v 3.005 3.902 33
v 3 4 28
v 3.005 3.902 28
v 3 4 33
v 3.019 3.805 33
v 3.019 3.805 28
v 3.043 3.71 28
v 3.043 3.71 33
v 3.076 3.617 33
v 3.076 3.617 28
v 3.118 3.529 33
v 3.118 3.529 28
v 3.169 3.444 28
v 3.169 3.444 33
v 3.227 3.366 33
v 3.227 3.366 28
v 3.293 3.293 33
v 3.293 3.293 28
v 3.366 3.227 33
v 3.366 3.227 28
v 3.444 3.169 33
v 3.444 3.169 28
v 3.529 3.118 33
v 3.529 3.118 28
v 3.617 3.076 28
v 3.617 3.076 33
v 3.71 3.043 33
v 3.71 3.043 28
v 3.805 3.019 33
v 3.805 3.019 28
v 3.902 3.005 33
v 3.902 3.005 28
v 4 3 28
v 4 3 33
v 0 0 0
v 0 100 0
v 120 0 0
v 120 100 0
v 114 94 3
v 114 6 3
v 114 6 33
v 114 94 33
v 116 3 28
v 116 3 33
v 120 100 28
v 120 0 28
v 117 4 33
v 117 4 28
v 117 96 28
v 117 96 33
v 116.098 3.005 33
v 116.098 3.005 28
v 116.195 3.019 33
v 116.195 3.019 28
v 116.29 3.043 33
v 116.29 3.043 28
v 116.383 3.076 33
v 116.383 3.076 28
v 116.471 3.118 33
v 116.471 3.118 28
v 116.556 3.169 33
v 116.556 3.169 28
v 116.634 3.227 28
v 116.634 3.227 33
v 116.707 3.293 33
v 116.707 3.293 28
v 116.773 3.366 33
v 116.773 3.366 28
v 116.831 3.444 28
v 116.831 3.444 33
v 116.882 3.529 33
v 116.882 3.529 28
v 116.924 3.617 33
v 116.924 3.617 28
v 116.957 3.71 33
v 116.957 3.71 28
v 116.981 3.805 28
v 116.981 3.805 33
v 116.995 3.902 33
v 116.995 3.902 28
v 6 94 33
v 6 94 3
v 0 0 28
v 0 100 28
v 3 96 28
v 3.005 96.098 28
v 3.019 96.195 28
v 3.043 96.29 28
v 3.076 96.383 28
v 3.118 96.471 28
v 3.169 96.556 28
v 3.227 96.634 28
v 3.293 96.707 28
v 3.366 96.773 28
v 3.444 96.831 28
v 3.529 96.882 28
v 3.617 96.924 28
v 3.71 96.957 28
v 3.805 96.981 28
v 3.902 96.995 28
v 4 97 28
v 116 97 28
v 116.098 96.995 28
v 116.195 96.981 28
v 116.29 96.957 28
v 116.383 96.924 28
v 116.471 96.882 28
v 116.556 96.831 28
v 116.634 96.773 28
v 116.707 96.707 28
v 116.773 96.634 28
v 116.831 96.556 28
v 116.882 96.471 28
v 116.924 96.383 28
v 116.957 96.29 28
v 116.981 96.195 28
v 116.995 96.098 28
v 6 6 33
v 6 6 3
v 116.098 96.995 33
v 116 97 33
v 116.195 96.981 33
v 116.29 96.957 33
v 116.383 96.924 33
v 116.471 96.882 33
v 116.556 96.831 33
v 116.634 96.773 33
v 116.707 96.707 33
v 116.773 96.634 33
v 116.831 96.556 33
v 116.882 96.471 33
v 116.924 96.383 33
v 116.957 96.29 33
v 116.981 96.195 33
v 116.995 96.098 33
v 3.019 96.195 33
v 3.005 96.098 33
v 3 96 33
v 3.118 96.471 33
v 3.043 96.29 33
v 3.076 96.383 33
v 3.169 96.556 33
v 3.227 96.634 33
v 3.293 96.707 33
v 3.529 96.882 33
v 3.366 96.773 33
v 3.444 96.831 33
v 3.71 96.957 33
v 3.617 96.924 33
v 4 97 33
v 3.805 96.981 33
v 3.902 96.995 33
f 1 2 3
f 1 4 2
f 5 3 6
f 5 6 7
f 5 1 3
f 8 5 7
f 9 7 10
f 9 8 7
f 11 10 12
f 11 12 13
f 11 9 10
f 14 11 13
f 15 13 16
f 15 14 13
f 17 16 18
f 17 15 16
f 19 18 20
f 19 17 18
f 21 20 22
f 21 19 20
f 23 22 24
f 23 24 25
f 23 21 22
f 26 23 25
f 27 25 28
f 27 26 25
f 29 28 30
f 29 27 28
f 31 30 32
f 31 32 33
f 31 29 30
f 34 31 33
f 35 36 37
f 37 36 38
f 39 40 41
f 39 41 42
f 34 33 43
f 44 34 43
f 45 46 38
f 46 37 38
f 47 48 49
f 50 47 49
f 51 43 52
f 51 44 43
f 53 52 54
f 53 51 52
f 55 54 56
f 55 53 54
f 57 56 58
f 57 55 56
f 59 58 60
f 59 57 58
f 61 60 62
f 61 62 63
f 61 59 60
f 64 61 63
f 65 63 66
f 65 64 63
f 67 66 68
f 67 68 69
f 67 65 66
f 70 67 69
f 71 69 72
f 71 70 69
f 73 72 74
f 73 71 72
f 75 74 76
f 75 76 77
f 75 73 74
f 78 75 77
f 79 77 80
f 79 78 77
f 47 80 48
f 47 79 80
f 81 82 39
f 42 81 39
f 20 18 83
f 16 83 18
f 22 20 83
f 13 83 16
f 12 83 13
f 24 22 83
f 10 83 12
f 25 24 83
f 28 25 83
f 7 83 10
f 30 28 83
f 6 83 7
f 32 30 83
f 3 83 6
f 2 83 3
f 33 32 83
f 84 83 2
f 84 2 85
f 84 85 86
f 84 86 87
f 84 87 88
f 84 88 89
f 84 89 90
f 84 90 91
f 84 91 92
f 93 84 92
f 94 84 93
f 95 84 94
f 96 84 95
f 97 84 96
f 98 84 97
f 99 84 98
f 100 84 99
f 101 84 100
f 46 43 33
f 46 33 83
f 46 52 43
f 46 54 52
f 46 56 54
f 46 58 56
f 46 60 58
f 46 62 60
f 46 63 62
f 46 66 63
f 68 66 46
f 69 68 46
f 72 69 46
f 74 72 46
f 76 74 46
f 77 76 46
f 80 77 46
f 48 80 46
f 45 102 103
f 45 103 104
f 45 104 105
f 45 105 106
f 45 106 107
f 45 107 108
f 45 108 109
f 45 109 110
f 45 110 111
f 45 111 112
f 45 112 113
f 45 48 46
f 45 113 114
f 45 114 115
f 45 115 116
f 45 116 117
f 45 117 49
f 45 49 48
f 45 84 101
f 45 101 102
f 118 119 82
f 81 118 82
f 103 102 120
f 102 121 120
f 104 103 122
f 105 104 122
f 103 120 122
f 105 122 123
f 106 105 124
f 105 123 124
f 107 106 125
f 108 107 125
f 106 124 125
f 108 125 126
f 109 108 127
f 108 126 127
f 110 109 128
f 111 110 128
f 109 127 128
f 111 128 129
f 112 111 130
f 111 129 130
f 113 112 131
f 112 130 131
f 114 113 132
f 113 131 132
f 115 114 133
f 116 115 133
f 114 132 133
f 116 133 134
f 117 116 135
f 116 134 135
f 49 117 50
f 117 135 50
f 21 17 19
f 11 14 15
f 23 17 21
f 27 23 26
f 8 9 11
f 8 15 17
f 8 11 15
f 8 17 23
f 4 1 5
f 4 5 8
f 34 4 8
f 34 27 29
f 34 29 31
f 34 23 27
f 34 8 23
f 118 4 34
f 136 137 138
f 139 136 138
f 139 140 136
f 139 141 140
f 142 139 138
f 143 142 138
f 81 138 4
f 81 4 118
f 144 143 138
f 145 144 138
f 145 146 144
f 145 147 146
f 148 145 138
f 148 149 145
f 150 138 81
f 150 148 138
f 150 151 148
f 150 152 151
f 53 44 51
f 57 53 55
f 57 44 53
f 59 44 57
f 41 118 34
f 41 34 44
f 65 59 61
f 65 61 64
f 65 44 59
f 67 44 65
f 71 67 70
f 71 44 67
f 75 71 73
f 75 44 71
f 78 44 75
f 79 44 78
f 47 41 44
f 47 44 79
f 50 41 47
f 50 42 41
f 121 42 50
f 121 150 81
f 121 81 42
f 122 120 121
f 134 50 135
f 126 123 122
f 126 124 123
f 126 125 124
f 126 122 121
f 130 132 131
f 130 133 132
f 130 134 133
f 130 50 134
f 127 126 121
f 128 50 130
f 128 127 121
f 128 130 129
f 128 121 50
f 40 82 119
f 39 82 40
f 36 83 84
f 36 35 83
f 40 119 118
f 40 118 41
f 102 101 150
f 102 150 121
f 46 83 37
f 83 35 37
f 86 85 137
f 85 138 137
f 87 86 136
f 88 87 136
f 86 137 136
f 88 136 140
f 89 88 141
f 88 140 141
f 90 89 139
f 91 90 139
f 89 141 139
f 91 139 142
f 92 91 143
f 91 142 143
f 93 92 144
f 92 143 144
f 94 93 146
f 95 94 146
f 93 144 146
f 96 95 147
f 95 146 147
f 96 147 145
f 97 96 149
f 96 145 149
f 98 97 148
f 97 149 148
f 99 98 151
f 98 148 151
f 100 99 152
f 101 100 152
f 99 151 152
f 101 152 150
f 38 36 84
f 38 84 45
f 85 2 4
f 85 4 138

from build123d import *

# Parameters (mm, degrees)
CROQUIS1_W              = 120
CROQUIS1_H              = 100
SALIENTE_EXTRUIR1_DEPTH = 3
CROQUIS3_W              = 120
CROQUIS3_H              = 100
CROQUIS3_W_2            = 114
CROQUIS3_H_2            = 94
SALIENTE_EXTRUIR2_DEPTH = 25
CROQUIS4_W              = 114
CROQUIS4_H              = 94
CROQUIS4_W_2            = 108
CROQUIS4_H_2            = 88
SALIENTE_EXTRUIR3_DEPTH = 30
REDONDEO1_R             = 1


with BuildPart() as part:
    # Croquis1 → Saliente-Extruir1 (new body)
    with BuildSketch(Plane.XY):
        with Locations((60, 50)):
            Rectangle(CROQUIS1_W, CROQUIS1_H)
    extrude(amount=SALIENTE_EXTRUIR1_DEPTH)

    # Croquis3 → Saliente-Extruir2 (add)
    with BuildSketch(Plane.XY.offset(3)):
        with Locations((60, 50)):
            Rectangle(CROQUIS3_W, CROQUIS3_H)
        with Locations((60, 50)):
            Rectangle(CROQUIS3_W_2, CROQUIS3_H_2, mode=Mode.SUBTRACT)
    extrude(amount=SALIENTE_EXTRUIR2_DEPTH)

    # Croquis4 → Saliente-Extruir3 (add)
    with BuildSketch(Plane.XY.offset(3)):
        with Locations((60, 50)):
            Rectangle(CROQUIS4_W, CROQUIS4_H)
        with Locations((60, 50)):
            Rectangle(CROQUIS4_W_2, CROQUIS4_H_2, mode=Mode.SUBTRACT)
    extrude(amount=SALIENTE_EXTRUIR3_DEPTH)

    # Redondeo1
    redondeo1_edges = [part.edges().sort_by_distance(p)[0] for p in [
        (3, 97, 30.5),
        (3, 3, 30.5),
        (117, 3, 30.5),
        (117, 97, 30.5),
    ]]
    fillet(redondeo1_edges, radius=REDONDEO1_R)


solid = part.part
